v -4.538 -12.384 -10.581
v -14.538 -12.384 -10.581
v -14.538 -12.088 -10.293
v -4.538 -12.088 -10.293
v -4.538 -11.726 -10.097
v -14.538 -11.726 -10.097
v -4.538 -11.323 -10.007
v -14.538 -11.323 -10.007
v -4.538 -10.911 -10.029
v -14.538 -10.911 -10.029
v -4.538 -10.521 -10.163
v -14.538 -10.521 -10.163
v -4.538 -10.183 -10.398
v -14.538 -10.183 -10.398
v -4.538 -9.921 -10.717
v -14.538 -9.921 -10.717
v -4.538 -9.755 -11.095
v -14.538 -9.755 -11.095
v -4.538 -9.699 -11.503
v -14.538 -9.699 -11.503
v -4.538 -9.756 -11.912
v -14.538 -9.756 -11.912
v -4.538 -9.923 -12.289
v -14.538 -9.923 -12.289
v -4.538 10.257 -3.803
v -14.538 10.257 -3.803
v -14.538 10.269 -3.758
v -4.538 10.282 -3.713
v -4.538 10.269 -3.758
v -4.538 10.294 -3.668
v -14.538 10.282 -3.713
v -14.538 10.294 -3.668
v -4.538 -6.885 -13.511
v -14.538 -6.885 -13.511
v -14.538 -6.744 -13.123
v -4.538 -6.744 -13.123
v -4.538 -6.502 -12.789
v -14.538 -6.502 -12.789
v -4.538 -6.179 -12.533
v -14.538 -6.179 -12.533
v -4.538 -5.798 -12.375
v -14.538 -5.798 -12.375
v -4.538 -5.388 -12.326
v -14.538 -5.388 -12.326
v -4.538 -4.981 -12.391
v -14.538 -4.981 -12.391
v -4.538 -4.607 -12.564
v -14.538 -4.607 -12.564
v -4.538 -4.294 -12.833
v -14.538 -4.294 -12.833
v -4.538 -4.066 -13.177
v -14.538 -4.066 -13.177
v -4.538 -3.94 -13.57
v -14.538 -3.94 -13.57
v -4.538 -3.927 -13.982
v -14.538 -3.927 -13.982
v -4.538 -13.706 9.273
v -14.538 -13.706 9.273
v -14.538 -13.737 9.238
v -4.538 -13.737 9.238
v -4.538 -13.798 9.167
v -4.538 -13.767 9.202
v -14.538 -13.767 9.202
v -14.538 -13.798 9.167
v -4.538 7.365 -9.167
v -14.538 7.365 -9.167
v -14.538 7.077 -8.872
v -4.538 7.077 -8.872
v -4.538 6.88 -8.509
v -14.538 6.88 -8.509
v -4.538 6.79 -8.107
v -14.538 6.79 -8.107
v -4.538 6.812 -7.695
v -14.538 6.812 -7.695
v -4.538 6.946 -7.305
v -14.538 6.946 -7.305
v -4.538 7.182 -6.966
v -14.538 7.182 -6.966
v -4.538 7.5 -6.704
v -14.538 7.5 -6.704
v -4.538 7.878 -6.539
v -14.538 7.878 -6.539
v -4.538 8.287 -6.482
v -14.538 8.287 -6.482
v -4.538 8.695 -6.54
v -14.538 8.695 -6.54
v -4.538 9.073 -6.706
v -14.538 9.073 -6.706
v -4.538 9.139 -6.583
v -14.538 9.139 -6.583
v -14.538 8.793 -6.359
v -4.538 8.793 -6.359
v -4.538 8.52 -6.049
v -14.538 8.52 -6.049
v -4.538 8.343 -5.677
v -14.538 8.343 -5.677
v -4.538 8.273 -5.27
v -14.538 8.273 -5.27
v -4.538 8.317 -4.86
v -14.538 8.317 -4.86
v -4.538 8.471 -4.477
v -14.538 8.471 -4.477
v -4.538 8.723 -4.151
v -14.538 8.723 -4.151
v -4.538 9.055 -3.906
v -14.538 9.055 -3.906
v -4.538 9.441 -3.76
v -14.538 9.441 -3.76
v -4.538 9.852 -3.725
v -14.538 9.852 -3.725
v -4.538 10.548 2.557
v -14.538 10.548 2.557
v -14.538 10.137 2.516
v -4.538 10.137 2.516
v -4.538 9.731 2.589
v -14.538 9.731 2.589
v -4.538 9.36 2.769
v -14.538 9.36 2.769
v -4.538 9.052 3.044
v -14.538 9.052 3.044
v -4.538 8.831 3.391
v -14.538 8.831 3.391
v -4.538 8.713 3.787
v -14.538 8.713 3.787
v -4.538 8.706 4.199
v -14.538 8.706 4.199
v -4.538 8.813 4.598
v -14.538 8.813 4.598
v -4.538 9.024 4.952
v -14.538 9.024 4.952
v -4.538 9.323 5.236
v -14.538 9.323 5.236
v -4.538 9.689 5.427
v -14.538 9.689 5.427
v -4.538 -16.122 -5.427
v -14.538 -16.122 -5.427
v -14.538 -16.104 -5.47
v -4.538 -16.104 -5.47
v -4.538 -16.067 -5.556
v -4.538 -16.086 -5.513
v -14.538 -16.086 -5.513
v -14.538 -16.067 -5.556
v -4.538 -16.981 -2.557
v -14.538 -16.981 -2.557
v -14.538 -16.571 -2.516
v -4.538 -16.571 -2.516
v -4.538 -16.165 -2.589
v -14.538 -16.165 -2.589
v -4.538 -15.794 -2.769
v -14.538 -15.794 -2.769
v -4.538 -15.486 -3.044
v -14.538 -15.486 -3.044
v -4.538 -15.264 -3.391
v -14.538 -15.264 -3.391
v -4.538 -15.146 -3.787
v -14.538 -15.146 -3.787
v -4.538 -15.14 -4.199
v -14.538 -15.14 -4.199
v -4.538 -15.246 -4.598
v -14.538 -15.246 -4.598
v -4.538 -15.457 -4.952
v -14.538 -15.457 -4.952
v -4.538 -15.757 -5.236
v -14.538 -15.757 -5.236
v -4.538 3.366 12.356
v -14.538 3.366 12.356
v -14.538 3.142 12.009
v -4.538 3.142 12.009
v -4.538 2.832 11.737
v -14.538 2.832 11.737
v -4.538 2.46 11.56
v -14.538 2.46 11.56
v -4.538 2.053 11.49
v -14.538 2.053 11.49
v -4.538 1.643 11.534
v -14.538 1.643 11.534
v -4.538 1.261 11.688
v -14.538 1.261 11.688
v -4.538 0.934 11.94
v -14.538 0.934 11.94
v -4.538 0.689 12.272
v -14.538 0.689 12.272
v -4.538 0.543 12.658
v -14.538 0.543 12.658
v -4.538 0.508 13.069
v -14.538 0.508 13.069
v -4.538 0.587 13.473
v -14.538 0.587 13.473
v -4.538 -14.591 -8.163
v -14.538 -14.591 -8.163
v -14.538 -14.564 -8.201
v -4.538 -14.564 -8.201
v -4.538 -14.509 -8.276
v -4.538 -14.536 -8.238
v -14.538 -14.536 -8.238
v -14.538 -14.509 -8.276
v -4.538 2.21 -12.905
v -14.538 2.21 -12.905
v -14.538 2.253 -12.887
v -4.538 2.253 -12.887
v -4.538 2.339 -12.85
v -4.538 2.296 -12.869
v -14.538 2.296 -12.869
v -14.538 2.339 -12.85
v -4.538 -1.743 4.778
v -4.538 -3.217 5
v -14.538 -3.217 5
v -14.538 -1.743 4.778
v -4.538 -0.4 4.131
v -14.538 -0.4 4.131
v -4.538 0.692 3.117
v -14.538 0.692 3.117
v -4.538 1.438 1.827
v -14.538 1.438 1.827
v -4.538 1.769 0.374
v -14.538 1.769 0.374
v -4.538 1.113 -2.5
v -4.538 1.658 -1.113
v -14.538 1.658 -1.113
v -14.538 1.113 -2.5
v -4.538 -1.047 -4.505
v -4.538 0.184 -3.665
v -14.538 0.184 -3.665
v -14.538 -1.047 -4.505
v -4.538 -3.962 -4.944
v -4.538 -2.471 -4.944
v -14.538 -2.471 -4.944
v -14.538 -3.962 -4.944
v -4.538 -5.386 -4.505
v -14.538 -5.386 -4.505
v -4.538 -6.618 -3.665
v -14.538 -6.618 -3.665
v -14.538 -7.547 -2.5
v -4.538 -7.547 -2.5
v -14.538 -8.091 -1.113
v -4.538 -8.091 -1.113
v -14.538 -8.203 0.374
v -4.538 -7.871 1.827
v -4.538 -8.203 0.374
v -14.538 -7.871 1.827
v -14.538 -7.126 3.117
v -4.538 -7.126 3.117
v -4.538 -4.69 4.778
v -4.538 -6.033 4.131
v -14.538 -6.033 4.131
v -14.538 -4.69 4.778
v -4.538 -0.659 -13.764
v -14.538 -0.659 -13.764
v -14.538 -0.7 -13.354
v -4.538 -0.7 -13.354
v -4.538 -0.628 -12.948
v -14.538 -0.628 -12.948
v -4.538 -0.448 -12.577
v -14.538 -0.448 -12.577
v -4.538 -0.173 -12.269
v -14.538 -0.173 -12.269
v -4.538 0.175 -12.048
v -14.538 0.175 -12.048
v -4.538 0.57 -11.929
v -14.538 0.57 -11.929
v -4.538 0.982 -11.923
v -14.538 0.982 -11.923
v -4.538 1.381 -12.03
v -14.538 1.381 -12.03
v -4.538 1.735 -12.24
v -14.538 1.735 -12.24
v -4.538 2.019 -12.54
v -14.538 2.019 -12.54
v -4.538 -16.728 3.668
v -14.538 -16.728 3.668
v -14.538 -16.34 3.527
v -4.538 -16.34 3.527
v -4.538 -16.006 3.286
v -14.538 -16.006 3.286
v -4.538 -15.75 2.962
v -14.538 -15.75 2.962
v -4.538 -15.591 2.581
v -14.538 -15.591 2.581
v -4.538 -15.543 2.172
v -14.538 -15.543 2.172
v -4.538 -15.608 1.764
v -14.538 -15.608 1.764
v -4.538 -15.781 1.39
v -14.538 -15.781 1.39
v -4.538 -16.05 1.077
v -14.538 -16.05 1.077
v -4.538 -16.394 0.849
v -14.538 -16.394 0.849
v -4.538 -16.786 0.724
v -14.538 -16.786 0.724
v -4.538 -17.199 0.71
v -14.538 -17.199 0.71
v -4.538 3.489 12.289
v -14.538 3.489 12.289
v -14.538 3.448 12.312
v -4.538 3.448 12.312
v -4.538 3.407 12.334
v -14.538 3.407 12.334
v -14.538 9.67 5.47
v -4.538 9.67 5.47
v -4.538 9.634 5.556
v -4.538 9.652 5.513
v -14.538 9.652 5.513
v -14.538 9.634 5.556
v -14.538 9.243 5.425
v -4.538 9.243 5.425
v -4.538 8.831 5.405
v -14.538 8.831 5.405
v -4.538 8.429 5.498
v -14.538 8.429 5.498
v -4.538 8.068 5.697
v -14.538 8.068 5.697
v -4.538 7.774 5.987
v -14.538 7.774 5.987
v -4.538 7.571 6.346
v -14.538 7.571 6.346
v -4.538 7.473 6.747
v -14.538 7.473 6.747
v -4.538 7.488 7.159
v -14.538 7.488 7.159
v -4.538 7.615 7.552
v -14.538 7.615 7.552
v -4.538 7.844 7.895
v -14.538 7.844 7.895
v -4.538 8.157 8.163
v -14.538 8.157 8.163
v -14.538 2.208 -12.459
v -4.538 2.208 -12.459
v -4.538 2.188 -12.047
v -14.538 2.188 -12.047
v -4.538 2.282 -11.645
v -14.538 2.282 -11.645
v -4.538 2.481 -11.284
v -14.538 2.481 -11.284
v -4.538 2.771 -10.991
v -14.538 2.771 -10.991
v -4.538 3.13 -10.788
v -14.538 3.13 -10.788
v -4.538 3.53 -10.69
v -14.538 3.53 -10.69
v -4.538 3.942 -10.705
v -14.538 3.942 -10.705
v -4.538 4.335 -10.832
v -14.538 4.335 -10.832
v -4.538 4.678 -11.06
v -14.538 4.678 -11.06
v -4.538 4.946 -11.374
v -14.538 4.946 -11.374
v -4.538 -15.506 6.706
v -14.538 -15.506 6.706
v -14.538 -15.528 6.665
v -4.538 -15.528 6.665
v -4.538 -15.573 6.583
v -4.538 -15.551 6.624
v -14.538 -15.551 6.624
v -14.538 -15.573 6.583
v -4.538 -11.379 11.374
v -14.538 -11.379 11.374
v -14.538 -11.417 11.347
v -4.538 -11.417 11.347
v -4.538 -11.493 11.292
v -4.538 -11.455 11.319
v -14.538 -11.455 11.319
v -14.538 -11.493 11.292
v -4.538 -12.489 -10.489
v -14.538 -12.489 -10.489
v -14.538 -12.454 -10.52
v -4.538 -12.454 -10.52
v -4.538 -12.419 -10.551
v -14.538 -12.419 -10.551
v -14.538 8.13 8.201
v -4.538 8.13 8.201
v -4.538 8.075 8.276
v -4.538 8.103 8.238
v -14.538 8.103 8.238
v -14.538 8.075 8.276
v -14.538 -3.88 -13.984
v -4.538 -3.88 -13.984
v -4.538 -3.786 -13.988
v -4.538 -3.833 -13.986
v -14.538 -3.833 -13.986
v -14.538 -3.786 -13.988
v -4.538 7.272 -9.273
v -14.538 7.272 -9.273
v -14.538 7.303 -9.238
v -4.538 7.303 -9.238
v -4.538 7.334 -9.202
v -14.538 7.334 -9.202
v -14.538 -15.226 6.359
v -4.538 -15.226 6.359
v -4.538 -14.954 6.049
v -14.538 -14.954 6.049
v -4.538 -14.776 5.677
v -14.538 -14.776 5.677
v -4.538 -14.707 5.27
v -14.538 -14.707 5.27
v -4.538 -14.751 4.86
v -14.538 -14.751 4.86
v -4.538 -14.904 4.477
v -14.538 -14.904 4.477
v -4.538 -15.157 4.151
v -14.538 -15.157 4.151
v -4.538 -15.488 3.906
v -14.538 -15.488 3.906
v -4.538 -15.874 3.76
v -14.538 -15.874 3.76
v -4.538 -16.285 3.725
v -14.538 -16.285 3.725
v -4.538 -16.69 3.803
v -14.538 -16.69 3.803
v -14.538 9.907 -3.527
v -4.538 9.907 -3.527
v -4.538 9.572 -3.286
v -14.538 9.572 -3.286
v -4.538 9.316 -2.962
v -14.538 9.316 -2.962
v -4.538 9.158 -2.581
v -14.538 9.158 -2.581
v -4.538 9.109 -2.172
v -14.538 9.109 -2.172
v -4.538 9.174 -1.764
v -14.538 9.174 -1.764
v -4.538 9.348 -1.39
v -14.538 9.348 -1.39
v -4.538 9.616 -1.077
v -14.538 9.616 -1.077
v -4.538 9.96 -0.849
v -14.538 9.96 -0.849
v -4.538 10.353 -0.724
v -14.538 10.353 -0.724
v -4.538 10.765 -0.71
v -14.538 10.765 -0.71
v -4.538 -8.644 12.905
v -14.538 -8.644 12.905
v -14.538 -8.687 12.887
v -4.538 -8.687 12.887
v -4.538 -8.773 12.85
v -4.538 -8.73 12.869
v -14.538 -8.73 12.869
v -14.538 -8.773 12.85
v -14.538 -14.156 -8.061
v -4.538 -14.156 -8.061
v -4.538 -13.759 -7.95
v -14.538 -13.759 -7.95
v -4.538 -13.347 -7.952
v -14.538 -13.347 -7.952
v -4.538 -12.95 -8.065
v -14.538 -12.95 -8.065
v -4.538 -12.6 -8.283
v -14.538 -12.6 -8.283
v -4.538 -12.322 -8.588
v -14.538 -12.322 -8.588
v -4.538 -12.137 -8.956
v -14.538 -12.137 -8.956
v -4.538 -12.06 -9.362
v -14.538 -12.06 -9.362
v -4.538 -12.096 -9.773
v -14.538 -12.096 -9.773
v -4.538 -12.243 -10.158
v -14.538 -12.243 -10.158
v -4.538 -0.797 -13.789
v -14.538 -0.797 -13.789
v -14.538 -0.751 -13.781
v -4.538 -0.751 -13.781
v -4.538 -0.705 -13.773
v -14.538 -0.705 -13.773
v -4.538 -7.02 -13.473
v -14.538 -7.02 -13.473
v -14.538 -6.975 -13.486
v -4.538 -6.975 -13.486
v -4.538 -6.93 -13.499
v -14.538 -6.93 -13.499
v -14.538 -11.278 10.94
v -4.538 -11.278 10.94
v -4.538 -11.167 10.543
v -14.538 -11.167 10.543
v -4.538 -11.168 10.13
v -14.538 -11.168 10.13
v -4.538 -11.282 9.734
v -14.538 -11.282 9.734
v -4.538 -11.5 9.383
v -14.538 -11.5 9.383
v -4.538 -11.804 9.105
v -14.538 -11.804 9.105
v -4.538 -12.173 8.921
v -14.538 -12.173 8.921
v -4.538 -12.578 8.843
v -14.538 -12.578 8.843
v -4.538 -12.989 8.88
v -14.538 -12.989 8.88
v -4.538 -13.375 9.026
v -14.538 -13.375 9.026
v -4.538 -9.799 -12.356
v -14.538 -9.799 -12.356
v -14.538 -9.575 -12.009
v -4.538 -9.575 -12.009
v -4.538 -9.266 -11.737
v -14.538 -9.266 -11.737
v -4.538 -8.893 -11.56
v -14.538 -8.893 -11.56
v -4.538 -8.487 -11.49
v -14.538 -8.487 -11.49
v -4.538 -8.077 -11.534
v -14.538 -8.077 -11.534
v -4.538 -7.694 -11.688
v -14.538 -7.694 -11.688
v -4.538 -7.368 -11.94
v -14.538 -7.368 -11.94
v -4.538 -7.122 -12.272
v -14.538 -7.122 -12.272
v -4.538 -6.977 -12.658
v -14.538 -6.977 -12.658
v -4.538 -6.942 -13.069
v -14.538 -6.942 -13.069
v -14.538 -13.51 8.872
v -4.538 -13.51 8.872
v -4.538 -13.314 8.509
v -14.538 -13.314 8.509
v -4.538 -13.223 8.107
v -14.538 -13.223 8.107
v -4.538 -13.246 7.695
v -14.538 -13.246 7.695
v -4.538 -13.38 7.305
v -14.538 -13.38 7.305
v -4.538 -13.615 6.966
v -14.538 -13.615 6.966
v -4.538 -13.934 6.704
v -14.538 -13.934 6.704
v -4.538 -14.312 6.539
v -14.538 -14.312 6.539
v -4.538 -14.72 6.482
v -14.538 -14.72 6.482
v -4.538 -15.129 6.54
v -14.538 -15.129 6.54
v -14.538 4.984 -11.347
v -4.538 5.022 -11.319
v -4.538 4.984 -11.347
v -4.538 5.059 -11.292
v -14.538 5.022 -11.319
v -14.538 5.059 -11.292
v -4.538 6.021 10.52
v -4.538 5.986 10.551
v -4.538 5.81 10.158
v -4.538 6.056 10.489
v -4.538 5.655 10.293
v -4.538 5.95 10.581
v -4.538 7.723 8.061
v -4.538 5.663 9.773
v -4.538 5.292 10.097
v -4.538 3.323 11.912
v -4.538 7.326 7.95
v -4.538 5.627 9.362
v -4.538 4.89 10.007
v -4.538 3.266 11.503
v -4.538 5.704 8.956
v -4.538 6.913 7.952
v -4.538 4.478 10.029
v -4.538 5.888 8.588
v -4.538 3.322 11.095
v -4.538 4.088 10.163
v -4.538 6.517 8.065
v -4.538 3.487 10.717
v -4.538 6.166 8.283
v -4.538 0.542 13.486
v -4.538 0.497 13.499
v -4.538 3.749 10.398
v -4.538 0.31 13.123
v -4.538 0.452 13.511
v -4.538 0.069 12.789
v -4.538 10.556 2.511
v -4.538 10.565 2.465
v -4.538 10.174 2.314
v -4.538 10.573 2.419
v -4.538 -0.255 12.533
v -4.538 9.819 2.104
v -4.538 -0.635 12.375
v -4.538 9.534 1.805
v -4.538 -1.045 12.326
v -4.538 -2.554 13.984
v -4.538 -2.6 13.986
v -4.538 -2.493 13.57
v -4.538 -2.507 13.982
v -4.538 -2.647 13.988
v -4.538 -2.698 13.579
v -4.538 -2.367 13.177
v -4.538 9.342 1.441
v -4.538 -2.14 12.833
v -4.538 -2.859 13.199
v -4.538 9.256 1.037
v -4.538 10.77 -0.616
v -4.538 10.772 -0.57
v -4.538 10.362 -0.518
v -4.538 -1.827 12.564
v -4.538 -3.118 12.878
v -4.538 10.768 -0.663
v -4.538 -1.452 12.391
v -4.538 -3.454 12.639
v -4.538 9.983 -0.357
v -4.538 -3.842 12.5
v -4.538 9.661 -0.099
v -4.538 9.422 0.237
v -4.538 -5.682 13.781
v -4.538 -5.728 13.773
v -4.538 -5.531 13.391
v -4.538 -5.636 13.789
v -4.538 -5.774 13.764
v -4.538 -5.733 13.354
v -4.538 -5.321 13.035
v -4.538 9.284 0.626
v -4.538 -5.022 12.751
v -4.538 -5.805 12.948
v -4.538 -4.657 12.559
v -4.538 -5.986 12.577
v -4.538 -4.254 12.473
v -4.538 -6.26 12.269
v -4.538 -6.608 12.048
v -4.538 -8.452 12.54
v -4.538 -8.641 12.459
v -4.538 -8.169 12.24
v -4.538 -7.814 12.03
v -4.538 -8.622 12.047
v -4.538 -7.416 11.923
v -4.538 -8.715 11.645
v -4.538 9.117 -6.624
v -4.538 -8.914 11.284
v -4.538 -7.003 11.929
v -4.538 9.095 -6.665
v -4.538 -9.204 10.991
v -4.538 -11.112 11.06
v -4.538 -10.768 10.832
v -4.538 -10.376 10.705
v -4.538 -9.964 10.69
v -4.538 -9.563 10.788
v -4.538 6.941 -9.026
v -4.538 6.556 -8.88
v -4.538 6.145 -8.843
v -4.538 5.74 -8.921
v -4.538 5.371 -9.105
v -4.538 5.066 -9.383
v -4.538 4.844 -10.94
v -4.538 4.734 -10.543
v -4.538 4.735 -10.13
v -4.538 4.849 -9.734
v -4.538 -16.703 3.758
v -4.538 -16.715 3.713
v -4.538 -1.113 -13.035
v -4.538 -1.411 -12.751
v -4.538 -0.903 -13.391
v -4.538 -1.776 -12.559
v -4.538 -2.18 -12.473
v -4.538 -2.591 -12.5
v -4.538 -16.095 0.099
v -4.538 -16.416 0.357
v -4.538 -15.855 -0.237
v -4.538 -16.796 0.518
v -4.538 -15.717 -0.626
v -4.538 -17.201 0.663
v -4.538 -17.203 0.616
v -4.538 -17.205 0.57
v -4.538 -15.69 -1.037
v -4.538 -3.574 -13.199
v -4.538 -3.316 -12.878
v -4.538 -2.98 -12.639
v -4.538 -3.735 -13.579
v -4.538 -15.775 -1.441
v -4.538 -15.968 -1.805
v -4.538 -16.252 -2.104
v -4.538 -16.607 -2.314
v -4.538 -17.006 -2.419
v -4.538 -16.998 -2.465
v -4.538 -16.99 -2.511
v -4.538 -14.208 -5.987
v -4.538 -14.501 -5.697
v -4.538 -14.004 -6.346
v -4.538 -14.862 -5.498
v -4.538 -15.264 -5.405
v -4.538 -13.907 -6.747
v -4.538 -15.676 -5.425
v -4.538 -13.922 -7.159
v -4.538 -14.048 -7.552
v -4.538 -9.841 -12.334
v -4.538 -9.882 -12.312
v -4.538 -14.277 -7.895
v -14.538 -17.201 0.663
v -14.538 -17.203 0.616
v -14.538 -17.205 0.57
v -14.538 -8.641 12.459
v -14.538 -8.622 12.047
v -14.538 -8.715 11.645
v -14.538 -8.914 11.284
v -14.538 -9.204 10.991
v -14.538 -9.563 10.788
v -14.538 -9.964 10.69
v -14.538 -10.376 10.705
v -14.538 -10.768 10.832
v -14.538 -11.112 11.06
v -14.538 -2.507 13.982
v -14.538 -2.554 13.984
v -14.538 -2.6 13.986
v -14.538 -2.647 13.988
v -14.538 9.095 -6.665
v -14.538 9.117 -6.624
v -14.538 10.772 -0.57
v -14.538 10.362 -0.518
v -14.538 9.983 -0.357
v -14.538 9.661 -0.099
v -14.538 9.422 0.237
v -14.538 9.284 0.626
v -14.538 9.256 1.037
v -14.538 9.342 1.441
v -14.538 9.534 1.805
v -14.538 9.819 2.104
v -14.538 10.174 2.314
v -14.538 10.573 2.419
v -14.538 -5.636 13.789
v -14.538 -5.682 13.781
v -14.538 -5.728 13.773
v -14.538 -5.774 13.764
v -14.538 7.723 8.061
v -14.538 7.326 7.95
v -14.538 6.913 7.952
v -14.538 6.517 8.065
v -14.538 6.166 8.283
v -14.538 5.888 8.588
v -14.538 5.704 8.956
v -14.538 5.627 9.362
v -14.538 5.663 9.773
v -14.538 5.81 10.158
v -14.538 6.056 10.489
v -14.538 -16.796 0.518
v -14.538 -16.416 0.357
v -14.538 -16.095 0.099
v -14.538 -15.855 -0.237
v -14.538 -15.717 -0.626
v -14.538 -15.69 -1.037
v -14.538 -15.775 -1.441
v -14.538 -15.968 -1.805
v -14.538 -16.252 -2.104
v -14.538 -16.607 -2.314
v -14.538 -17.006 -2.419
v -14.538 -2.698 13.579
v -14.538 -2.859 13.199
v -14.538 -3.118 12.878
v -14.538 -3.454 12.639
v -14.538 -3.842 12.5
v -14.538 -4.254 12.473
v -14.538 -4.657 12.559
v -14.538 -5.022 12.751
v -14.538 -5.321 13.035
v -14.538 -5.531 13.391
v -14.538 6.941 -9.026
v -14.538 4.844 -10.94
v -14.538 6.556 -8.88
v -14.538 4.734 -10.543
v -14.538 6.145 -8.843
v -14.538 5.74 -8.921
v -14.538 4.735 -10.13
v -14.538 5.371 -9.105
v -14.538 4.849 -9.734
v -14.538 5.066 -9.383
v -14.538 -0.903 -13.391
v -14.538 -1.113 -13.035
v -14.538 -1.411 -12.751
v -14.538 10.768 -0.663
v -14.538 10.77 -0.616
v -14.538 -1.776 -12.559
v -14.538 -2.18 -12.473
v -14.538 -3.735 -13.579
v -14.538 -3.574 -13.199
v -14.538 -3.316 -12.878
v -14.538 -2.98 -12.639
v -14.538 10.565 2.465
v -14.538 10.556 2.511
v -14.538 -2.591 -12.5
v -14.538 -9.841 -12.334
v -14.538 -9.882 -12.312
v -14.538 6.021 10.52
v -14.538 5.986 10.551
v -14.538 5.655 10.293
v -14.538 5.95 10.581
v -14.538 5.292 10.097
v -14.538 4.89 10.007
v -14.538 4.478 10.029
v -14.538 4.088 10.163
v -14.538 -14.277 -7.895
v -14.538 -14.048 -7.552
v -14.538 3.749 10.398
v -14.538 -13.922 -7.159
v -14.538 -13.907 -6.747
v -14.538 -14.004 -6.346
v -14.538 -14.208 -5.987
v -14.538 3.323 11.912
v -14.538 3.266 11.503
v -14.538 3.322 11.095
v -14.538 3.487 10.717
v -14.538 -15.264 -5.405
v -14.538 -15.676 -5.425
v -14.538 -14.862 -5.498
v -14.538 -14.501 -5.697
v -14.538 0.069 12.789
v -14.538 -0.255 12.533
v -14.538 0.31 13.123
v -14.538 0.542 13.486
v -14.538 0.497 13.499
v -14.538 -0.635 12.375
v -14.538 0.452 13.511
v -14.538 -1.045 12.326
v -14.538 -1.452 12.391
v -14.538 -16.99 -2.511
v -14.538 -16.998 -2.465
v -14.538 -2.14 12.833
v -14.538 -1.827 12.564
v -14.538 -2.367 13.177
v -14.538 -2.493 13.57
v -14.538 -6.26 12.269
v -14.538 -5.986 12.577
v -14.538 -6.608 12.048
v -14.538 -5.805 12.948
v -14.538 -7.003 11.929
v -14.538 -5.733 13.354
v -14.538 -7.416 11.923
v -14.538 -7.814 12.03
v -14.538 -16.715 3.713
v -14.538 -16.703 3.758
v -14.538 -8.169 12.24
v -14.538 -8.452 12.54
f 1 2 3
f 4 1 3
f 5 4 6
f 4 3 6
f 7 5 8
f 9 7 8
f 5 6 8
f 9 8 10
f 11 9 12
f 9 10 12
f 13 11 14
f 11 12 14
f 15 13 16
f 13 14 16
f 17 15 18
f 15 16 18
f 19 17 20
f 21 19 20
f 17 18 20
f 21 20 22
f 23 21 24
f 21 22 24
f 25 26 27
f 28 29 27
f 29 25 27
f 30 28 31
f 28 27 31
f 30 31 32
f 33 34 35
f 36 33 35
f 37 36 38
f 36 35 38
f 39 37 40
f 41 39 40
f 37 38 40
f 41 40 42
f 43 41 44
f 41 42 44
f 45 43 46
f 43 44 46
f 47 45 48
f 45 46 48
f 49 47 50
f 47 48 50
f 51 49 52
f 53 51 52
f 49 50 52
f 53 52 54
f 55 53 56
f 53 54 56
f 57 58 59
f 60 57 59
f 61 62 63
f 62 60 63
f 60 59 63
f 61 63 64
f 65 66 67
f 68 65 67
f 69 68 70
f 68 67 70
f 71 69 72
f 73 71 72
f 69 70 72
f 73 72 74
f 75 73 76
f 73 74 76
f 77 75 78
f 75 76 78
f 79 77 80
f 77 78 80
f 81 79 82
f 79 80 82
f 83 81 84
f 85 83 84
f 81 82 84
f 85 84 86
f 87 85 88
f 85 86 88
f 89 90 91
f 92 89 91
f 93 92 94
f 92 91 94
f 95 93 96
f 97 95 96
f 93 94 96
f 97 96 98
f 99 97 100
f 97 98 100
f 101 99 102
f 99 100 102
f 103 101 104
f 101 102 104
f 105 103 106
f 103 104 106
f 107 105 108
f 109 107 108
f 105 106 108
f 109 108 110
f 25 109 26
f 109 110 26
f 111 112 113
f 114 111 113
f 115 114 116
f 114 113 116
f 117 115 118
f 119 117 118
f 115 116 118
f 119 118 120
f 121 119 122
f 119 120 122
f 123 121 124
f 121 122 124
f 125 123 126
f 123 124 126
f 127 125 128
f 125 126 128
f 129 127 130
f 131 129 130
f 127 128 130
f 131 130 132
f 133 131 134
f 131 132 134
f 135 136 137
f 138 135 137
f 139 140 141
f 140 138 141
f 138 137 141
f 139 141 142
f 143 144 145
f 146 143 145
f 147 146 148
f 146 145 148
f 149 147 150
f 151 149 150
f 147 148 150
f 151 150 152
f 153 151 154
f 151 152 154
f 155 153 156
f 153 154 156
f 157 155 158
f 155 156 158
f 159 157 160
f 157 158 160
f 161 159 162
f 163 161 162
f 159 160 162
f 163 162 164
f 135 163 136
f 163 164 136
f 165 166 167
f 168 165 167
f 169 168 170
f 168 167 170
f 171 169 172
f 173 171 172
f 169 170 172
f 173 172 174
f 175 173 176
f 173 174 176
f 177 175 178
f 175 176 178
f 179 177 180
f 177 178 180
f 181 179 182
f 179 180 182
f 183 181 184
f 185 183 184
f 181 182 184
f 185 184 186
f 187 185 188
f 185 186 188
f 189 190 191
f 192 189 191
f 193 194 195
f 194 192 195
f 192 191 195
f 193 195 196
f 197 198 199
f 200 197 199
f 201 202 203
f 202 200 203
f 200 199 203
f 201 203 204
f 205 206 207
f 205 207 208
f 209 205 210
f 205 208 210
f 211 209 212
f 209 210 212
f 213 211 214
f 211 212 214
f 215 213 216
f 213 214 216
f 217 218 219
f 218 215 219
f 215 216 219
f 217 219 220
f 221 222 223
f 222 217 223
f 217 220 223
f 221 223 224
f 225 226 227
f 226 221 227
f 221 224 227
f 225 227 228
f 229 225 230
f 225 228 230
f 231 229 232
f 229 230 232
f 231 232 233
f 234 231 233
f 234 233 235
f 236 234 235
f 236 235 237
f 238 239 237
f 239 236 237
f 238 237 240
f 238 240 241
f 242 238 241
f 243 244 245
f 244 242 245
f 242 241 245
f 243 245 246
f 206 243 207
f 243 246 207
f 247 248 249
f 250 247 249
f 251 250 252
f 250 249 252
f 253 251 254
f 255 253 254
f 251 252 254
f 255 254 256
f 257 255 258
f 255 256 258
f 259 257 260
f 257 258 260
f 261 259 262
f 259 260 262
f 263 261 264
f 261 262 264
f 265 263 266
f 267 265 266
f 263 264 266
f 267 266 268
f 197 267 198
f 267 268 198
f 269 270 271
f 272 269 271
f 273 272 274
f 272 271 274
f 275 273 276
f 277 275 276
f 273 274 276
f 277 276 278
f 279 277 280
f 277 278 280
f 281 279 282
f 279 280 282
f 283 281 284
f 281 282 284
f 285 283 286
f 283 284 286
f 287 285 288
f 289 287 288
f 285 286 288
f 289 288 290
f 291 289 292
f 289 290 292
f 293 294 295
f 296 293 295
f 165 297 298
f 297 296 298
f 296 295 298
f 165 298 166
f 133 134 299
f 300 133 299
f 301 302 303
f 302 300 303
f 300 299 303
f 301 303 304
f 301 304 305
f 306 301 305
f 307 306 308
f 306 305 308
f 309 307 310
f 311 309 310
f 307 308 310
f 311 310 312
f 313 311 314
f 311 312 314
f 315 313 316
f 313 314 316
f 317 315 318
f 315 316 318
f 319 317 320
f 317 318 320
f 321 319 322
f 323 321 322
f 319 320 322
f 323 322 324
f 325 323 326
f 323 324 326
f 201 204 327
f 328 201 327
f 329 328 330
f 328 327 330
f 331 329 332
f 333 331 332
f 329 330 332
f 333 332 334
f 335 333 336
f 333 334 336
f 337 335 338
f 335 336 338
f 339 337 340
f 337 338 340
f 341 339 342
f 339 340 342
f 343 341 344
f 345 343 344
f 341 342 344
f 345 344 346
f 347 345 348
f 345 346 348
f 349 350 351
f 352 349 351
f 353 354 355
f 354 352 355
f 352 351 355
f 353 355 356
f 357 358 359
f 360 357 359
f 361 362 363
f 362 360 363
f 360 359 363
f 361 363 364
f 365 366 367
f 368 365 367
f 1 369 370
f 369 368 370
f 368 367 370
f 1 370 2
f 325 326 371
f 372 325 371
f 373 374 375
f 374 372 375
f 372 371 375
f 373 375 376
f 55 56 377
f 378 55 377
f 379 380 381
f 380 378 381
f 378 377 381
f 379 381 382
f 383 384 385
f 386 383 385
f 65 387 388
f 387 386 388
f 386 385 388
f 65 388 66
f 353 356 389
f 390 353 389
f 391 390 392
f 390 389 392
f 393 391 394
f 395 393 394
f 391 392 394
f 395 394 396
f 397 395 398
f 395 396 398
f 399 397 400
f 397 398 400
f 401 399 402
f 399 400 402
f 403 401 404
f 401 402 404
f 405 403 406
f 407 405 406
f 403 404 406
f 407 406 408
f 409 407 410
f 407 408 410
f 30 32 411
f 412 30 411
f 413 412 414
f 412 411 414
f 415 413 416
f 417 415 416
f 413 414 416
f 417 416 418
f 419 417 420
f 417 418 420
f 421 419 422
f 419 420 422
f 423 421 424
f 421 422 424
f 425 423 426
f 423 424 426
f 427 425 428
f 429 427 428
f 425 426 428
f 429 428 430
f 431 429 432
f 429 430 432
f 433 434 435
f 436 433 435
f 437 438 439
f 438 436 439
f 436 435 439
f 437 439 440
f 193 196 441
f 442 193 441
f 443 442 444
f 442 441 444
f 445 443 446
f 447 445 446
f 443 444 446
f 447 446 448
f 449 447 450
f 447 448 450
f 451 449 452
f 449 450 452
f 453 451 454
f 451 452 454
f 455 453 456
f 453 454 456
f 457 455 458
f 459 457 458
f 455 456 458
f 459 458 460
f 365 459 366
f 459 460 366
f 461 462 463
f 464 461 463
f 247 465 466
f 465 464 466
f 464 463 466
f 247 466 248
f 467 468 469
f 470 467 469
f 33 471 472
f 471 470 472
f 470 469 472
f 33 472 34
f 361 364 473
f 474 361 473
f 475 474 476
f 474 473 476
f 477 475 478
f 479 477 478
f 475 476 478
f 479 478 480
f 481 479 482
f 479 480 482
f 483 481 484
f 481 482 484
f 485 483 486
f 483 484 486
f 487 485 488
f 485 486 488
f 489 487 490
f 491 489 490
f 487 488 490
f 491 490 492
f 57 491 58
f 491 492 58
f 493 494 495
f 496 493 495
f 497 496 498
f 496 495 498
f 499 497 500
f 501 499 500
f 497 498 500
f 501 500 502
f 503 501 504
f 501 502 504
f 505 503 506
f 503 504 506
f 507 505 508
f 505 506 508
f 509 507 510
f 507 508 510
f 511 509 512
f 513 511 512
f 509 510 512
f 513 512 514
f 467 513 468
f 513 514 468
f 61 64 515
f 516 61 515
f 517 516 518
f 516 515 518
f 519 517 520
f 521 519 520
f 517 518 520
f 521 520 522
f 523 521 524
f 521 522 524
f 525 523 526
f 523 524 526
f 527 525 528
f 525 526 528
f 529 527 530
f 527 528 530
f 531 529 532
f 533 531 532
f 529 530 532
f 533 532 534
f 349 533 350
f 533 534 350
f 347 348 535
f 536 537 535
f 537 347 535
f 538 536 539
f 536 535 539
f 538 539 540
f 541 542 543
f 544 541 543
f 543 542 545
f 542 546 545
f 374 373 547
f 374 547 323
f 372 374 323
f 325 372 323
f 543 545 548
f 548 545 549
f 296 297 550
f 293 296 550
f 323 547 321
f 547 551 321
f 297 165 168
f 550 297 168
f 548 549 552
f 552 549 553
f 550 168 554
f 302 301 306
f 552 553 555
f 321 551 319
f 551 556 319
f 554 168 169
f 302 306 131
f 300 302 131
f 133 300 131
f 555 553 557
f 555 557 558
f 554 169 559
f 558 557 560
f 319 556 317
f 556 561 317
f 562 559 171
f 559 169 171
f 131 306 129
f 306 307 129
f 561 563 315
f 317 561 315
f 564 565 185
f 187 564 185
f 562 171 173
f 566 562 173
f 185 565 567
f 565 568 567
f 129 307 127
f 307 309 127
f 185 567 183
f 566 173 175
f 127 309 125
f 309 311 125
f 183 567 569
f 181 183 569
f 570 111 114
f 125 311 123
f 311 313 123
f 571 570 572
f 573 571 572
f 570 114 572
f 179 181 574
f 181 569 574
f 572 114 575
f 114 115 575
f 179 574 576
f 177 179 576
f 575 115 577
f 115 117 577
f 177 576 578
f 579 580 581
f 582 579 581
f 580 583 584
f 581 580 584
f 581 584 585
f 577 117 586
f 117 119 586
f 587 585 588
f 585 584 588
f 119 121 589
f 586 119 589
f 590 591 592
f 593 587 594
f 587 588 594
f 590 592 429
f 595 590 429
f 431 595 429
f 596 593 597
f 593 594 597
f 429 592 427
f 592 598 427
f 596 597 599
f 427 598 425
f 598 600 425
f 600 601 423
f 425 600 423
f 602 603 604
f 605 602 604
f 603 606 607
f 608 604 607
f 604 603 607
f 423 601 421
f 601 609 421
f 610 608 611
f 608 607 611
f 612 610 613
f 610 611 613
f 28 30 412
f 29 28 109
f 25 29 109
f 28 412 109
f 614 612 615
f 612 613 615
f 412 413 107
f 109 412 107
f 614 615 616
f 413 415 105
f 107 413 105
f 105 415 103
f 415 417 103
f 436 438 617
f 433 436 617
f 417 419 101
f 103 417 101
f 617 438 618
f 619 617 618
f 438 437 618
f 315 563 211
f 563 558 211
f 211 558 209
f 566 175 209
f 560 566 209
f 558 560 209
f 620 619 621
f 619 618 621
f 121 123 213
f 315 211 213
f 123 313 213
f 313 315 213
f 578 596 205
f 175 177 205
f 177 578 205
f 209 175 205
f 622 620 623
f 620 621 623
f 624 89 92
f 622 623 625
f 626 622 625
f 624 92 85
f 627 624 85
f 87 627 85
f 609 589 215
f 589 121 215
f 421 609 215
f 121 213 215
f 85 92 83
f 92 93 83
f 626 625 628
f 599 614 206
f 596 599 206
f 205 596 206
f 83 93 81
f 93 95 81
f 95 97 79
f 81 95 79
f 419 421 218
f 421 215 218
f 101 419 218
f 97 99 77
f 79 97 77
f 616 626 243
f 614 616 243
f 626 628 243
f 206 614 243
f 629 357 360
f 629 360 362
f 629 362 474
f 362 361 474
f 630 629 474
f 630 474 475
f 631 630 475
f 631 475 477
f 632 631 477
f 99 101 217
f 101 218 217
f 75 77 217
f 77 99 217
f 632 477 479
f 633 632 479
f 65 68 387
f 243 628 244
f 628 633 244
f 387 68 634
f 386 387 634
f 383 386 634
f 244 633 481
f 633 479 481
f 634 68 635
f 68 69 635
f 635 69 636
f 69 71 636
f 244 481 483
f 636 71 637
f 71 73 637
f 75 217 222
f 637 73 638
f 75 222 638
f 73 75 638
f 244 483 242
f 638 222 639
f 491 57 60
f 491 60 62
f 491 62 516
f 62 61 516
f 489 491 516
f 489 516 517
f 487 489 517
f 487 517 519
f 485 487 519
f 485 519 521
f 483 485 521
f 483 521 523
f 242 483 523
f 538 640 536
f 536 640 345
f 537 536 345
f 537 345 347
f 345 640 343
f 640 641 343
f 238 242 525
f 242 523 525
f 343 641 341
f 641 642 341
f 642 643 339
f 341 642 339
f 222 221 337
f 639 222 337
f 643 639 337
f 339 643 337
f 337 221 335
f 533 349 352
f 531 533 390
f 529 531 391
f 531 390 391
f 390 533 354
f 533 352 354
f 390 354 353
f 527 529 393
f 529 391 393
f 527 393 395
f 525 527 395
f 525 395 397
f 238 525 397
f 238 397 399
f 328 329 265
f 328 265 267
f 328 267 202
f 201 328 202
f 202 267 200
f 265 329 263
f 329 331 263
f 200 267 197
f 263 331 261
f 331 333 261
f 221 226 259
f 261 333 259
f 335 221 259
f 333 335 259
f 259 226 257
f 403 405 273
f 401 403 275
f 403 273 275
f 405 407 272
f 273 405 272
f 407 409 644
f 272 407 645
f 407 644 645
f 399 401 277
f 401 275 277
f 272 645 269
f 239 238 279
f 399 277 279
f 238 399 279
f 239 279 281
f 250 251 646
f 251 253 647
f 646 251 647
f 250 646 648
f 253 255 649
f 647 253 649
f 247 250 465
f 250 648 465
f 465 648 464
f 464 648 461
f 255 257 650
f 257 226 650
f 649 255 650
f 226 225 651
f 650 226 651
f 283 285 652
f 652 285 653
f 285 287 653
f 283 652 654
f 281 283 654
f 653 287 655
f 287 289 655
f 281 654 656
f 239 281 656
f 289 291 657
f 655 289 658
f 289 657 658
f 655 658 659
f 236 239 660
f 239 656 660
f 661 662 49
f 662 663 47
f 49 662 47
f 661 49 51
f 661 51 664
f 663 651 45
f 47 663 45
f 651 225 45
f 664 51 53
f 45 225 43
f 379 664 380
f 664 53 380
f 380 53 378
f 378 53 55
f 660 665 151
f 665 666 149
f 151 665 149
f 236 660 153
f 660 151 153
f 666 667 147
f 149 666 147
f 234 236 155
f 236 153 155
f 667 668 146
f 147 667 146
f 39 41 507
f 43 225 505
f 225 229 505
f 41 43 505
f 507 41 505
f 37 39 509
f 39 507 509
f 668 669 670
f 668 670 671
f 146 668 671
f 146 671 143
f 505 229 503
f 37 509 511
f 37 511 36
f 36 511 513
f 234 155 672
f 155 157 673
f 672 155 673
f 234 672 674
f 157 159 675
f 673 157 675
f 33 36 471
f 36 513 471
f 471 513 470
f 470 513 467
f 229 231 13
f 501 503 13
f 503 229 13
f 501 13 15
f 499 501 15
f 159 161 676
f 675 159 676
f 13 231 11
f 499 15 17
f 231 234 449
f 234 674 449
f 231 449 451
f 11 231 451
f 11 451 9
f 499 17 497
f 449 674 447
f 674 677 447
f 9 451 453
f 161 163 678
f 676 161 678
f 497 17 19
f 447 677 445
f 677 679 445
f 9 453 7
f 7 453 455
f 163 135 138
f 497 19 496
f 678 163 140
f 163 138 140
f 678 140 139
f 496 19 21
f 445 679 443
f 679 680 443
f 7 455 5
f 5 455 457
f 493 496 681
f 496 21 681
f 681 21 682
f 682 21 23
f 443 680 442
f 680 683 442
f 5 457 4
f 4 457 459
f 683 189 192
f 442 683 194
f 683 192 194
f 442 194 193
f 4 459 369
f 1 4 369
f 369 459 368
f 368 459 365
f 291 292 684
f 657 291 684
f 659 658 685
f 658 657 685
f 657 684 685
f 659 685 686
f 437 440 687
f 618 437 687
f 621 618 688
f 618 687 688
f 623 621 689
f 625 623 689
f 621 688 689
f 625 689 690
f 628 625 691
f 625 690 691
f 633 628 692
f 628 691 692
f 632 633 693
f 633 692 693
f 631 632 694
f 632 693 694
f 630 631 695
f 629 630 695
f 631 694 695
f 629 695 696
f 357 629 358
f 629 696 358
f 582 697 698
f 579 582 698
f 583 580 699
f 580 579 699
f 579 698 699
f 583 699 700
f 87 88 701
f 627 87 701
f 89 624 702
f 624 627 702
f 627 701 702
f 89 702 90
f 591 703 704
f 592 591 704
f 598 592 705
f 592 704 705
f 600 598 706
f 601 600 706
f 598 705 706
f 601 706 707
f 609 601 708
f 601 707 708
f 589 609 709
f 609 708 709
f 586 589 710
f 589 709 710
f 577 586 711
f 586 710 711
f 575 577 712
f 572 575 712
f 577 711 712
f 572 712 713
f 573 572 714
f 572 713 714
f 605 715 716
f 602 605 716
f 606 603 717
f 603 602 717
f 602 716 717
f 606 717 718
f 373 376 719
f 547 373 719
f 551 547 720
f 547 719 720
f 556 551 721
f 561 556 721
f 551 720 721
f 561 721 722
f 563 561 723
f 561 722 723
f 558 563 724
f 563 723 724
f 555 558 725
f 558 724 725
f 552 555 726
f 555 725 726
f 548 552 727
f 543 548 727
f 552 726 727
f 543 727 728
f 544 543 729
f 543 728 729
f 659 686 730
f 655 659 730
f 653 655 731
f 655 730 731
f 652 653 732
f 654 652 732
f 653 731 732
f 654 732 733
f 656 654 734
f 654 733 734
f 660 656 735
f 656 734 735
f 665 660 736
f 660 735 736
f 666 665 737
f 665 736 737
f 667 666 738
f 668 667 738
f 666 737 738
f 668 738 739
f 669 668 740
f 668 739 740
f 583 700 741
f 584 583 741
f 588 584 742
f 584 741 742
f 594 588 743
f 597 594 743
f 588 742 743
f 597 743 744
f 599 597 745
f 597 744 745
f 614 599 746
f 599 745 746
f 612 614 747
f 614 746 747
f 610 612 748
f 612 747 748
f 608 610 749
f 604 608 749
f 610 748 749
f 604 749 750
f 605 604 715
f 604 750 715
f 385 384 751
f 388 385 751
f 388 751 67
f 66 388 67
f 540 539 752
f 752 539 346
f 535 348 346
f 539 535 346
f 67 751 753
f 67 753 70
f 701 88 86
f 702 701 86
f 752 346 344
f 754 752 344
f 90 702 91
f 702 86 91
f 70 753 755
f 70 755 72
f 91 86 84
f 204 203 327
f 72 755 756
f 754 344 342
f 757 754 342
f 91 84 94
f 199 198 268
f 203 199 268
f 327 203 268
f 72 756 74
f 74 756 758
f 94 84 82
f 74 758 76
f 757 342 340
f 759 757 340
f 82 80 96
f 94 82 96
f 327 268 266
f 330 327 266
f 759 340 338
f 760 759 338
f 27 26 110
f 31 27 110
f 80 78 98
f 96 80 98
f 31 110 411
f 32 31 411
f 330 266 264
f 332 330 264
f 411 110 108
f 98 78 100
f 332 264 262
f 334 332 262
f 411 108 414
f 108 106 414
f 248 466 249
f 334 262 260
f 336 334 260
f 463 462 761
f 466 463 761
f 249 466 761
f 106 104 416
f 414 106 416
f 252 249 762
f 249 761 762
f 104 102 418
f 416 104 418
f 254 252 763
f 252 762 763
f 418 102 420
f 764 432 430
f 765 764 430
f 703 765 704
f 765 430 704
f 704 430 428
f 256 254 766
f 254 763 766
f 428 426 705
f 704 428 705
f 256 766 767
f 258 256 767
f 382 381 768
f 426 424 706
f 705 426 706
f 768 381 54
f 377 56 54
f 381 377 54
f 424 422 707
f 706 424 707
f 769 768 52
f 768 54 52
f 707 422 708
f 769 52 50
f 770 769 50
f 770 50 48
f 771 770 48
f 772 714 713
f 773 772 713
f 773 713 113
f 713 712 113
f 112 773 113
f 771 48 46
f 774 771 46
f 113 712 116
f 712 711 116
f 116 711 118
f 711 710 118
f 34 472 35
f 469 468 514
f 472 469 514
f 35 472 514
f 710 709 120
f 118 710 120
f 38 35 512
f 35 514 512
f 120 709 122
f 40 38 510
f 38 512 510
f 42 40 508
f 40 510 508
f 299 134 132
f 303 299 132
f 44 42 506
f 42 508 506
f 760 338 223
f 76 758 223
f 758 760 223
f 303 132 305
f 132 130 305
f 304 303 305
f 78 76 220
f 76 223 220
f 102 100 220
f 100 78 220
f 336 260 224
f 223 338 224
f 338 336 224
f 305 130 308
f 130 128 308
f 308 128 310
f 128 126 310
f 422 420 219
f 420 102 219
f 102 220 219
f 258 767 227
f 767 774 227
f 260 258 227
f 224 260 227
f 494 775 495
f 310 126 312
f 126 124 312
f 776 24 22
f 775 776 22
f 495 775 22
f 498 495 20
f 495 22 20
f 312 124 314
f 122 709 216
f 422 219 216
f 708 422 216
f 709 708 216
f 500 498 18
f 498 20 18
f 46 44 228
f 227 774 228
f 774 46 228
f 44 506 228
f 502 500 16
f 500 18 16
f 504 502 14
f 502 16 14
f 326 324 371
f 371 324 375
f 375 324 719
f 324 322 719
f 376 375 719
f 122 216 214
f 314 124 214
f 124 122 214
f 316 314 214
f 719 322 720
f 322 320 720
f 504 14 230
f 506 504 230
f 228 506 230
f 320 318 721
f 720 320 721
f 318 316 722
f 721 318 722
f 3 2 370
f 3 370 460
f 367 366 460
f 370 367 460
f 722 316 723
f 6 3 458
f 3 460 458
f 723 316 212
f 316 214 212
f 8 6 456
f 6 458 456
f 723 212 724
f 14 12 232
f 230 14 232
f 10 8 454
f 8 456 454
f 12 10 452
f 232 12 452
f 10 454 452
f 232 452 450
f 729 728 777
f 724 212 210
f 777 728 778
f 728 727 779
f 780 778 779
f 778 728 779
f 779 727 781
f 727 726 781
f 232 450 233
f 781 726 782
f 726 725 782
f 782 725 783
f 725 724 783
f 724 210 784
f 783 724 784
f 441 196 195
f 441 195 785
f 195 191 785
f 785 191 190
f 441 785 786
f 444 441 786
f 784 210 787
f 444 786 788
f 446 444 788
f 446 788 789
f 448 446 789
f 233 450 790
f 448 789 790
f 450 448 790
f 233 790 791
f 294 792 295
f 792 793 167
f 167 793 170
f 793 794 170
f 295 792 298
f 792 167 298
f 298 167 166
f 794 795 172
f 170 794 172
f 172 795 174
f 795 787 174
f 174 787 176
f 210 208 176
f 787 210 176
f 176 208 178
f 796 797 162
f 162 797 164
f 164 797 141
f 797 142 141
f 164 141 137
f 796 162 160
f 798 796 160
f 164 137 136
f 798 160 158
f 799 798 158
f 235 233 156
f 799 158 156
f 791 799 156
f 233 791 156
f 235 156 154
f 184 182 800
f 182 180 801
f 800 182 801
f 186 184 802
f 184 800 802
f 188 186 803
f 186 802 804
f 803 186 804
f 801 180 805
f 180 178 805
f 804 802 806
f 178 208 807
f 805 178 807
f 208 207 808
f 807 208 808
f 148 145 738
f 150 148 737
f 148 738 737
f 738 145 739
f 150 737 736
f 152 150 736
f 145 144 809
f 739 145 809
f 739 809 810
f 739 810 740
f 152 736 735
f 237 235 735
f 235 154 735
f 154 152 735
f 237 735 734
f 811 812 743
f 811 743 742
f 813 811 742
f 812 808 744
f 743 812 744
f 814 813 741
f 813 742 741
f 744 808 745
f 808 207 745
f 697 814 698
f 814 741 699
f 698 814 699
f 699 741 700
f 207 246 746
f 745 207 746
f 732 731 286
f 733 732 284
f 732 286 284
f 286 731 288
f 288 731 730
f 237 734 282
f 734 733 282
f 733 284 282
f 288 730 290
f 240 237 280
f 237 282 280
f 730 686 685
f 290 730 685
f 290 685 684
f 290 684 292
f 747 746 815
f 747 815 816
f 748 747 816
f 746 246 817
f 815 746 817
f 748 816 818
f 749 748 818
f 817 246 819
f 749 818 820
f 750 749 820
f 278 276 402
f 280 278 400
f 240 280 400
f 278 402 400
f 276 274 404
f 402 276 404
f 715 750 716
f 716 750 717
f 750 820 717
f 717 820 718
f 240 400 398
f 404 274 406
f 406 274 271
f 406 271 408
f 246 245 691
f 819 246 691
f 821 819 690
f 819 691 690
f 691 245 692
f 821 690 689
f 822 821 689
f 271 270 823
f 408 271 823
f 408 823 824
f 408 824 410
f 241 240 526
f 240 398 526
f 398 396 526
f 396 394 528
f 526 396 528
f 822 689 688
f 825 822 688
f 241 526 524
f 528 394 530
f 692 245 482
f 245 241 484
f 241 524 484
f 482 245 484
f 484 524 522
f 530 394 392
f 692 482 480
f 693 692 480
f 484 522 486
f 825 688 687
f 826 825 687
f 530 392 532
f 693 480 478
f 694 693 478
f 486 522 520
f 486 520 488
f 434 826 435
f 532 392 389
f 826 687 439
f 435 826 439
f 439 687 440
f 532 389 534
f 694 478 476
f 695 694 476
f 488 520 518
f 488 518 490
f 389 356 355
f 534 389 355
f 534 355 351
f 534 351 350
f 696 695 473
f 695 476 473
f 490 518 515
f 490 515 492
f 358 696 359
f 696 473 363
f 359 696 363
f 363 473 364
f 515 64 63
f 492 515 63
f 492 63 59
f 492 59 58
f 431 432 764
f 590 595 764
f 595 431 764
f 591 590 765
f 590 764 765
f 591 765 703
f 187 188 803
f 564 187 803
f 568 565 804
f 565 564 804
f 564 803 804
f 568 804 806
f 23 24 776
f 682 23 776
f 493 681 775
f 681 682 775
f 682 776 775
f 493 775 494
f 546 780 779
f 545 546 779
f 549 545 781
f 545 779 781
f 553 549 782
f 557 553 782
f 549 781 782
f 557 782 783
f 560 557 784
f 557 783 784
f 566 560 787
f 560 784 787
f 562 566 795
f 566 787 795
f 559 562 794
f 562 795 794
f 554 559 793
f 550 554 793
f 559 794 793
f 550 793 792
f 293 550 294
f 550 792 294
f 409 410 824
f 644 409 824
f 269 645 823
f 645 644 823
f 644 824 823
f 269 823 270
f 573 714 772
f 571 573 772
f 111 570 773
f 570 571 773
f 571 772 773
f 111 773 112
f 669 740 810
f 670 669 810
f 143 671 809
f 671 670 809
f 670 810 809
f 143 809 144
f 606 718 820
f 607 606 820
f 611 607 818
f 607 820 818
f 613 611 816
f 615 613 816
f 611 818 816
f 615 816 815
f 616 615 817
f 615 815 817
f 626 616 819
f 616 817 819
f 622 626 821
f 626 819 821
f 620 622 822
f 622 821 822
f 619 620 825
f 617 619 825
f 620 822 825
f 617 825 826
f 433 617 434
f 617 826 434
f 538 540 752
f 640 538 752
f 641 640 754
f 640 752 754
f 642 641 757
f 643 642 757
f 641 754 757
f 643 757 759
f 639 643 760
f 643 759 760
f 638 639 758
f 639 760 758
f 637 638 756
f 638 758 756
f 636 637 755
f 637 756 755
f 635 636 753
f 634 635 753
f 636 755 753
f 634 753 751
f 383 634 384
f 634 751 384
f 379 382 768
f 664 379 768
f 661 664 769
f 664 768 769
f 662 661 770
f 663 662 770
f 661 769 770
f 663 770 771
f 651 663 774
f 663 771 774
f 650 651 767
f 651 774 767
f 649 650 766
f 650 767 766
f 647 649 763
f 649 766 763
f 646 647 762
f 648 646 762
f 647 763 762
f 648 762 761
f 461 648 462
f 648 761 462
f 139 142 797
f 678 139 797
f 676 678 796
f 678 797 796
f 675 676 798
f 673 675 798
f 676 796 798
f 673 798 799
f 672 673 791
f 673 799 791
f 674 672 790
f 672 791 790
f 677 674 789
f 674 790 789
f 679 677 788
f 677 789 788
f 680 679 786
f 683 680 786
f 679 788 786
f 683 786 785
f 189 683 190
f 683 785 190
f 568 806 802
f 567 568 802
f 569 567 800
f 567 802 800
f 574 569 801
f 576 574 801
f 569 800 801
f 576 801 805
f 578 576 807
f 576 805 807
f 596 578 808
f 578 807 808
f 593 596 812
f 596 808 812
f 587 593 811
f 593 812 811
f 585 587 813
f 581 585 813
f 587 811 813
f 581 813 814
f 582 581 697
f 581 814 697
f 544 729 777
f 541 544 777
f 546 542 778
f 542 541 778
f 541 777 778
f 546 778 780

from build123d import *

# Parameters (mm, degrees)
CUT_EXTRUDE_1_DEPTH      = 10
PATTERN_CIRCULAR_2_COUNT = 28
SKETCH_3_R               = 5
CUT_EXTRUDE_2_DEPTH      = 26.454679665


with BuildPart() as part:
    # 草图1 → 旋转1 (revolve)
    with BuildSketch(Plane.XY, mode=Mode.PRIVATE) as revolve_1_sk:
        Polygon((-4.537524852, 10.783302268), (-14.537524852, 10.783302268), (-14.537524852, 1.783302268), (-15.787524852, 1.783302268), (-15.787524852, -3.216697732), (-3.287524852, -3.216697732), (-3.287524852, 1.783302268), (-4.537524852, 1.783302268), align=None)
    revolve(revolve_1_sk.sketch.rotate(Axis((-37.951477077, -3.216697732, 0), (1, 0, 0)), 90), axis=Axis((-37.951477077, -3.216697732, 0), (1, 0, 0)))

    # 草图2 → 切除-拉伸1 (cut)
    with BuildSketch(Plane.ZY.offset(14.537524852)):
        with BuildLine():
            Line((0.390901935, 85.320682721), (-0.569796452, 10.771702176))
            ThreePointArc((-0.569796452, 10.771702176), (0.830427689, 9.255687358), (2.419277547, 10.572685726))
            Line((2.419277547, 10.572685726), (11.35038276, 84.590986174))
            Line((11.35038276, 84.590986174), (21.256411219, 233.371913604))
            Line((21.256411219, 233.371913604), (10.296930394, 234.10161015))
            Line((10.296930394, 234.10161015), (0.390901935, 85.320682721))
        make_face()
    cut_extrude_1 = extrude(amount=-CUT_EXTRUDE_1_DEPTH, mode=Mode.SUBTRACT)

    # 阵列(圆周)2: 切除-拉伸1 ×28 about axis
    pattern_circular_2_axis = Axis((0, -3.216697732, 0), (1, 0, 0))
    for i in range(1, PATTERN_CIRCULAR_2_COUNT):
        add(cut_extrude_1.rotate(pattern_circular_2_axis, i * 360 / PATTERN_CIRCULAR_2_COUNT), mode=Mode.SUBTRACT)

    # 草图3 → 切除-拉伸2 (cut, through all)
    with BuildSketch(Plane.ZY.offset(15.787524852)):
        with Locations((0, -3.216697732)):
            Circle(SKETCH_3_R)
    extrude(amount=-CUT_EXTRUDE_2_DEPTH, mode=Mode.SUBTRACT)


solid = part.part
